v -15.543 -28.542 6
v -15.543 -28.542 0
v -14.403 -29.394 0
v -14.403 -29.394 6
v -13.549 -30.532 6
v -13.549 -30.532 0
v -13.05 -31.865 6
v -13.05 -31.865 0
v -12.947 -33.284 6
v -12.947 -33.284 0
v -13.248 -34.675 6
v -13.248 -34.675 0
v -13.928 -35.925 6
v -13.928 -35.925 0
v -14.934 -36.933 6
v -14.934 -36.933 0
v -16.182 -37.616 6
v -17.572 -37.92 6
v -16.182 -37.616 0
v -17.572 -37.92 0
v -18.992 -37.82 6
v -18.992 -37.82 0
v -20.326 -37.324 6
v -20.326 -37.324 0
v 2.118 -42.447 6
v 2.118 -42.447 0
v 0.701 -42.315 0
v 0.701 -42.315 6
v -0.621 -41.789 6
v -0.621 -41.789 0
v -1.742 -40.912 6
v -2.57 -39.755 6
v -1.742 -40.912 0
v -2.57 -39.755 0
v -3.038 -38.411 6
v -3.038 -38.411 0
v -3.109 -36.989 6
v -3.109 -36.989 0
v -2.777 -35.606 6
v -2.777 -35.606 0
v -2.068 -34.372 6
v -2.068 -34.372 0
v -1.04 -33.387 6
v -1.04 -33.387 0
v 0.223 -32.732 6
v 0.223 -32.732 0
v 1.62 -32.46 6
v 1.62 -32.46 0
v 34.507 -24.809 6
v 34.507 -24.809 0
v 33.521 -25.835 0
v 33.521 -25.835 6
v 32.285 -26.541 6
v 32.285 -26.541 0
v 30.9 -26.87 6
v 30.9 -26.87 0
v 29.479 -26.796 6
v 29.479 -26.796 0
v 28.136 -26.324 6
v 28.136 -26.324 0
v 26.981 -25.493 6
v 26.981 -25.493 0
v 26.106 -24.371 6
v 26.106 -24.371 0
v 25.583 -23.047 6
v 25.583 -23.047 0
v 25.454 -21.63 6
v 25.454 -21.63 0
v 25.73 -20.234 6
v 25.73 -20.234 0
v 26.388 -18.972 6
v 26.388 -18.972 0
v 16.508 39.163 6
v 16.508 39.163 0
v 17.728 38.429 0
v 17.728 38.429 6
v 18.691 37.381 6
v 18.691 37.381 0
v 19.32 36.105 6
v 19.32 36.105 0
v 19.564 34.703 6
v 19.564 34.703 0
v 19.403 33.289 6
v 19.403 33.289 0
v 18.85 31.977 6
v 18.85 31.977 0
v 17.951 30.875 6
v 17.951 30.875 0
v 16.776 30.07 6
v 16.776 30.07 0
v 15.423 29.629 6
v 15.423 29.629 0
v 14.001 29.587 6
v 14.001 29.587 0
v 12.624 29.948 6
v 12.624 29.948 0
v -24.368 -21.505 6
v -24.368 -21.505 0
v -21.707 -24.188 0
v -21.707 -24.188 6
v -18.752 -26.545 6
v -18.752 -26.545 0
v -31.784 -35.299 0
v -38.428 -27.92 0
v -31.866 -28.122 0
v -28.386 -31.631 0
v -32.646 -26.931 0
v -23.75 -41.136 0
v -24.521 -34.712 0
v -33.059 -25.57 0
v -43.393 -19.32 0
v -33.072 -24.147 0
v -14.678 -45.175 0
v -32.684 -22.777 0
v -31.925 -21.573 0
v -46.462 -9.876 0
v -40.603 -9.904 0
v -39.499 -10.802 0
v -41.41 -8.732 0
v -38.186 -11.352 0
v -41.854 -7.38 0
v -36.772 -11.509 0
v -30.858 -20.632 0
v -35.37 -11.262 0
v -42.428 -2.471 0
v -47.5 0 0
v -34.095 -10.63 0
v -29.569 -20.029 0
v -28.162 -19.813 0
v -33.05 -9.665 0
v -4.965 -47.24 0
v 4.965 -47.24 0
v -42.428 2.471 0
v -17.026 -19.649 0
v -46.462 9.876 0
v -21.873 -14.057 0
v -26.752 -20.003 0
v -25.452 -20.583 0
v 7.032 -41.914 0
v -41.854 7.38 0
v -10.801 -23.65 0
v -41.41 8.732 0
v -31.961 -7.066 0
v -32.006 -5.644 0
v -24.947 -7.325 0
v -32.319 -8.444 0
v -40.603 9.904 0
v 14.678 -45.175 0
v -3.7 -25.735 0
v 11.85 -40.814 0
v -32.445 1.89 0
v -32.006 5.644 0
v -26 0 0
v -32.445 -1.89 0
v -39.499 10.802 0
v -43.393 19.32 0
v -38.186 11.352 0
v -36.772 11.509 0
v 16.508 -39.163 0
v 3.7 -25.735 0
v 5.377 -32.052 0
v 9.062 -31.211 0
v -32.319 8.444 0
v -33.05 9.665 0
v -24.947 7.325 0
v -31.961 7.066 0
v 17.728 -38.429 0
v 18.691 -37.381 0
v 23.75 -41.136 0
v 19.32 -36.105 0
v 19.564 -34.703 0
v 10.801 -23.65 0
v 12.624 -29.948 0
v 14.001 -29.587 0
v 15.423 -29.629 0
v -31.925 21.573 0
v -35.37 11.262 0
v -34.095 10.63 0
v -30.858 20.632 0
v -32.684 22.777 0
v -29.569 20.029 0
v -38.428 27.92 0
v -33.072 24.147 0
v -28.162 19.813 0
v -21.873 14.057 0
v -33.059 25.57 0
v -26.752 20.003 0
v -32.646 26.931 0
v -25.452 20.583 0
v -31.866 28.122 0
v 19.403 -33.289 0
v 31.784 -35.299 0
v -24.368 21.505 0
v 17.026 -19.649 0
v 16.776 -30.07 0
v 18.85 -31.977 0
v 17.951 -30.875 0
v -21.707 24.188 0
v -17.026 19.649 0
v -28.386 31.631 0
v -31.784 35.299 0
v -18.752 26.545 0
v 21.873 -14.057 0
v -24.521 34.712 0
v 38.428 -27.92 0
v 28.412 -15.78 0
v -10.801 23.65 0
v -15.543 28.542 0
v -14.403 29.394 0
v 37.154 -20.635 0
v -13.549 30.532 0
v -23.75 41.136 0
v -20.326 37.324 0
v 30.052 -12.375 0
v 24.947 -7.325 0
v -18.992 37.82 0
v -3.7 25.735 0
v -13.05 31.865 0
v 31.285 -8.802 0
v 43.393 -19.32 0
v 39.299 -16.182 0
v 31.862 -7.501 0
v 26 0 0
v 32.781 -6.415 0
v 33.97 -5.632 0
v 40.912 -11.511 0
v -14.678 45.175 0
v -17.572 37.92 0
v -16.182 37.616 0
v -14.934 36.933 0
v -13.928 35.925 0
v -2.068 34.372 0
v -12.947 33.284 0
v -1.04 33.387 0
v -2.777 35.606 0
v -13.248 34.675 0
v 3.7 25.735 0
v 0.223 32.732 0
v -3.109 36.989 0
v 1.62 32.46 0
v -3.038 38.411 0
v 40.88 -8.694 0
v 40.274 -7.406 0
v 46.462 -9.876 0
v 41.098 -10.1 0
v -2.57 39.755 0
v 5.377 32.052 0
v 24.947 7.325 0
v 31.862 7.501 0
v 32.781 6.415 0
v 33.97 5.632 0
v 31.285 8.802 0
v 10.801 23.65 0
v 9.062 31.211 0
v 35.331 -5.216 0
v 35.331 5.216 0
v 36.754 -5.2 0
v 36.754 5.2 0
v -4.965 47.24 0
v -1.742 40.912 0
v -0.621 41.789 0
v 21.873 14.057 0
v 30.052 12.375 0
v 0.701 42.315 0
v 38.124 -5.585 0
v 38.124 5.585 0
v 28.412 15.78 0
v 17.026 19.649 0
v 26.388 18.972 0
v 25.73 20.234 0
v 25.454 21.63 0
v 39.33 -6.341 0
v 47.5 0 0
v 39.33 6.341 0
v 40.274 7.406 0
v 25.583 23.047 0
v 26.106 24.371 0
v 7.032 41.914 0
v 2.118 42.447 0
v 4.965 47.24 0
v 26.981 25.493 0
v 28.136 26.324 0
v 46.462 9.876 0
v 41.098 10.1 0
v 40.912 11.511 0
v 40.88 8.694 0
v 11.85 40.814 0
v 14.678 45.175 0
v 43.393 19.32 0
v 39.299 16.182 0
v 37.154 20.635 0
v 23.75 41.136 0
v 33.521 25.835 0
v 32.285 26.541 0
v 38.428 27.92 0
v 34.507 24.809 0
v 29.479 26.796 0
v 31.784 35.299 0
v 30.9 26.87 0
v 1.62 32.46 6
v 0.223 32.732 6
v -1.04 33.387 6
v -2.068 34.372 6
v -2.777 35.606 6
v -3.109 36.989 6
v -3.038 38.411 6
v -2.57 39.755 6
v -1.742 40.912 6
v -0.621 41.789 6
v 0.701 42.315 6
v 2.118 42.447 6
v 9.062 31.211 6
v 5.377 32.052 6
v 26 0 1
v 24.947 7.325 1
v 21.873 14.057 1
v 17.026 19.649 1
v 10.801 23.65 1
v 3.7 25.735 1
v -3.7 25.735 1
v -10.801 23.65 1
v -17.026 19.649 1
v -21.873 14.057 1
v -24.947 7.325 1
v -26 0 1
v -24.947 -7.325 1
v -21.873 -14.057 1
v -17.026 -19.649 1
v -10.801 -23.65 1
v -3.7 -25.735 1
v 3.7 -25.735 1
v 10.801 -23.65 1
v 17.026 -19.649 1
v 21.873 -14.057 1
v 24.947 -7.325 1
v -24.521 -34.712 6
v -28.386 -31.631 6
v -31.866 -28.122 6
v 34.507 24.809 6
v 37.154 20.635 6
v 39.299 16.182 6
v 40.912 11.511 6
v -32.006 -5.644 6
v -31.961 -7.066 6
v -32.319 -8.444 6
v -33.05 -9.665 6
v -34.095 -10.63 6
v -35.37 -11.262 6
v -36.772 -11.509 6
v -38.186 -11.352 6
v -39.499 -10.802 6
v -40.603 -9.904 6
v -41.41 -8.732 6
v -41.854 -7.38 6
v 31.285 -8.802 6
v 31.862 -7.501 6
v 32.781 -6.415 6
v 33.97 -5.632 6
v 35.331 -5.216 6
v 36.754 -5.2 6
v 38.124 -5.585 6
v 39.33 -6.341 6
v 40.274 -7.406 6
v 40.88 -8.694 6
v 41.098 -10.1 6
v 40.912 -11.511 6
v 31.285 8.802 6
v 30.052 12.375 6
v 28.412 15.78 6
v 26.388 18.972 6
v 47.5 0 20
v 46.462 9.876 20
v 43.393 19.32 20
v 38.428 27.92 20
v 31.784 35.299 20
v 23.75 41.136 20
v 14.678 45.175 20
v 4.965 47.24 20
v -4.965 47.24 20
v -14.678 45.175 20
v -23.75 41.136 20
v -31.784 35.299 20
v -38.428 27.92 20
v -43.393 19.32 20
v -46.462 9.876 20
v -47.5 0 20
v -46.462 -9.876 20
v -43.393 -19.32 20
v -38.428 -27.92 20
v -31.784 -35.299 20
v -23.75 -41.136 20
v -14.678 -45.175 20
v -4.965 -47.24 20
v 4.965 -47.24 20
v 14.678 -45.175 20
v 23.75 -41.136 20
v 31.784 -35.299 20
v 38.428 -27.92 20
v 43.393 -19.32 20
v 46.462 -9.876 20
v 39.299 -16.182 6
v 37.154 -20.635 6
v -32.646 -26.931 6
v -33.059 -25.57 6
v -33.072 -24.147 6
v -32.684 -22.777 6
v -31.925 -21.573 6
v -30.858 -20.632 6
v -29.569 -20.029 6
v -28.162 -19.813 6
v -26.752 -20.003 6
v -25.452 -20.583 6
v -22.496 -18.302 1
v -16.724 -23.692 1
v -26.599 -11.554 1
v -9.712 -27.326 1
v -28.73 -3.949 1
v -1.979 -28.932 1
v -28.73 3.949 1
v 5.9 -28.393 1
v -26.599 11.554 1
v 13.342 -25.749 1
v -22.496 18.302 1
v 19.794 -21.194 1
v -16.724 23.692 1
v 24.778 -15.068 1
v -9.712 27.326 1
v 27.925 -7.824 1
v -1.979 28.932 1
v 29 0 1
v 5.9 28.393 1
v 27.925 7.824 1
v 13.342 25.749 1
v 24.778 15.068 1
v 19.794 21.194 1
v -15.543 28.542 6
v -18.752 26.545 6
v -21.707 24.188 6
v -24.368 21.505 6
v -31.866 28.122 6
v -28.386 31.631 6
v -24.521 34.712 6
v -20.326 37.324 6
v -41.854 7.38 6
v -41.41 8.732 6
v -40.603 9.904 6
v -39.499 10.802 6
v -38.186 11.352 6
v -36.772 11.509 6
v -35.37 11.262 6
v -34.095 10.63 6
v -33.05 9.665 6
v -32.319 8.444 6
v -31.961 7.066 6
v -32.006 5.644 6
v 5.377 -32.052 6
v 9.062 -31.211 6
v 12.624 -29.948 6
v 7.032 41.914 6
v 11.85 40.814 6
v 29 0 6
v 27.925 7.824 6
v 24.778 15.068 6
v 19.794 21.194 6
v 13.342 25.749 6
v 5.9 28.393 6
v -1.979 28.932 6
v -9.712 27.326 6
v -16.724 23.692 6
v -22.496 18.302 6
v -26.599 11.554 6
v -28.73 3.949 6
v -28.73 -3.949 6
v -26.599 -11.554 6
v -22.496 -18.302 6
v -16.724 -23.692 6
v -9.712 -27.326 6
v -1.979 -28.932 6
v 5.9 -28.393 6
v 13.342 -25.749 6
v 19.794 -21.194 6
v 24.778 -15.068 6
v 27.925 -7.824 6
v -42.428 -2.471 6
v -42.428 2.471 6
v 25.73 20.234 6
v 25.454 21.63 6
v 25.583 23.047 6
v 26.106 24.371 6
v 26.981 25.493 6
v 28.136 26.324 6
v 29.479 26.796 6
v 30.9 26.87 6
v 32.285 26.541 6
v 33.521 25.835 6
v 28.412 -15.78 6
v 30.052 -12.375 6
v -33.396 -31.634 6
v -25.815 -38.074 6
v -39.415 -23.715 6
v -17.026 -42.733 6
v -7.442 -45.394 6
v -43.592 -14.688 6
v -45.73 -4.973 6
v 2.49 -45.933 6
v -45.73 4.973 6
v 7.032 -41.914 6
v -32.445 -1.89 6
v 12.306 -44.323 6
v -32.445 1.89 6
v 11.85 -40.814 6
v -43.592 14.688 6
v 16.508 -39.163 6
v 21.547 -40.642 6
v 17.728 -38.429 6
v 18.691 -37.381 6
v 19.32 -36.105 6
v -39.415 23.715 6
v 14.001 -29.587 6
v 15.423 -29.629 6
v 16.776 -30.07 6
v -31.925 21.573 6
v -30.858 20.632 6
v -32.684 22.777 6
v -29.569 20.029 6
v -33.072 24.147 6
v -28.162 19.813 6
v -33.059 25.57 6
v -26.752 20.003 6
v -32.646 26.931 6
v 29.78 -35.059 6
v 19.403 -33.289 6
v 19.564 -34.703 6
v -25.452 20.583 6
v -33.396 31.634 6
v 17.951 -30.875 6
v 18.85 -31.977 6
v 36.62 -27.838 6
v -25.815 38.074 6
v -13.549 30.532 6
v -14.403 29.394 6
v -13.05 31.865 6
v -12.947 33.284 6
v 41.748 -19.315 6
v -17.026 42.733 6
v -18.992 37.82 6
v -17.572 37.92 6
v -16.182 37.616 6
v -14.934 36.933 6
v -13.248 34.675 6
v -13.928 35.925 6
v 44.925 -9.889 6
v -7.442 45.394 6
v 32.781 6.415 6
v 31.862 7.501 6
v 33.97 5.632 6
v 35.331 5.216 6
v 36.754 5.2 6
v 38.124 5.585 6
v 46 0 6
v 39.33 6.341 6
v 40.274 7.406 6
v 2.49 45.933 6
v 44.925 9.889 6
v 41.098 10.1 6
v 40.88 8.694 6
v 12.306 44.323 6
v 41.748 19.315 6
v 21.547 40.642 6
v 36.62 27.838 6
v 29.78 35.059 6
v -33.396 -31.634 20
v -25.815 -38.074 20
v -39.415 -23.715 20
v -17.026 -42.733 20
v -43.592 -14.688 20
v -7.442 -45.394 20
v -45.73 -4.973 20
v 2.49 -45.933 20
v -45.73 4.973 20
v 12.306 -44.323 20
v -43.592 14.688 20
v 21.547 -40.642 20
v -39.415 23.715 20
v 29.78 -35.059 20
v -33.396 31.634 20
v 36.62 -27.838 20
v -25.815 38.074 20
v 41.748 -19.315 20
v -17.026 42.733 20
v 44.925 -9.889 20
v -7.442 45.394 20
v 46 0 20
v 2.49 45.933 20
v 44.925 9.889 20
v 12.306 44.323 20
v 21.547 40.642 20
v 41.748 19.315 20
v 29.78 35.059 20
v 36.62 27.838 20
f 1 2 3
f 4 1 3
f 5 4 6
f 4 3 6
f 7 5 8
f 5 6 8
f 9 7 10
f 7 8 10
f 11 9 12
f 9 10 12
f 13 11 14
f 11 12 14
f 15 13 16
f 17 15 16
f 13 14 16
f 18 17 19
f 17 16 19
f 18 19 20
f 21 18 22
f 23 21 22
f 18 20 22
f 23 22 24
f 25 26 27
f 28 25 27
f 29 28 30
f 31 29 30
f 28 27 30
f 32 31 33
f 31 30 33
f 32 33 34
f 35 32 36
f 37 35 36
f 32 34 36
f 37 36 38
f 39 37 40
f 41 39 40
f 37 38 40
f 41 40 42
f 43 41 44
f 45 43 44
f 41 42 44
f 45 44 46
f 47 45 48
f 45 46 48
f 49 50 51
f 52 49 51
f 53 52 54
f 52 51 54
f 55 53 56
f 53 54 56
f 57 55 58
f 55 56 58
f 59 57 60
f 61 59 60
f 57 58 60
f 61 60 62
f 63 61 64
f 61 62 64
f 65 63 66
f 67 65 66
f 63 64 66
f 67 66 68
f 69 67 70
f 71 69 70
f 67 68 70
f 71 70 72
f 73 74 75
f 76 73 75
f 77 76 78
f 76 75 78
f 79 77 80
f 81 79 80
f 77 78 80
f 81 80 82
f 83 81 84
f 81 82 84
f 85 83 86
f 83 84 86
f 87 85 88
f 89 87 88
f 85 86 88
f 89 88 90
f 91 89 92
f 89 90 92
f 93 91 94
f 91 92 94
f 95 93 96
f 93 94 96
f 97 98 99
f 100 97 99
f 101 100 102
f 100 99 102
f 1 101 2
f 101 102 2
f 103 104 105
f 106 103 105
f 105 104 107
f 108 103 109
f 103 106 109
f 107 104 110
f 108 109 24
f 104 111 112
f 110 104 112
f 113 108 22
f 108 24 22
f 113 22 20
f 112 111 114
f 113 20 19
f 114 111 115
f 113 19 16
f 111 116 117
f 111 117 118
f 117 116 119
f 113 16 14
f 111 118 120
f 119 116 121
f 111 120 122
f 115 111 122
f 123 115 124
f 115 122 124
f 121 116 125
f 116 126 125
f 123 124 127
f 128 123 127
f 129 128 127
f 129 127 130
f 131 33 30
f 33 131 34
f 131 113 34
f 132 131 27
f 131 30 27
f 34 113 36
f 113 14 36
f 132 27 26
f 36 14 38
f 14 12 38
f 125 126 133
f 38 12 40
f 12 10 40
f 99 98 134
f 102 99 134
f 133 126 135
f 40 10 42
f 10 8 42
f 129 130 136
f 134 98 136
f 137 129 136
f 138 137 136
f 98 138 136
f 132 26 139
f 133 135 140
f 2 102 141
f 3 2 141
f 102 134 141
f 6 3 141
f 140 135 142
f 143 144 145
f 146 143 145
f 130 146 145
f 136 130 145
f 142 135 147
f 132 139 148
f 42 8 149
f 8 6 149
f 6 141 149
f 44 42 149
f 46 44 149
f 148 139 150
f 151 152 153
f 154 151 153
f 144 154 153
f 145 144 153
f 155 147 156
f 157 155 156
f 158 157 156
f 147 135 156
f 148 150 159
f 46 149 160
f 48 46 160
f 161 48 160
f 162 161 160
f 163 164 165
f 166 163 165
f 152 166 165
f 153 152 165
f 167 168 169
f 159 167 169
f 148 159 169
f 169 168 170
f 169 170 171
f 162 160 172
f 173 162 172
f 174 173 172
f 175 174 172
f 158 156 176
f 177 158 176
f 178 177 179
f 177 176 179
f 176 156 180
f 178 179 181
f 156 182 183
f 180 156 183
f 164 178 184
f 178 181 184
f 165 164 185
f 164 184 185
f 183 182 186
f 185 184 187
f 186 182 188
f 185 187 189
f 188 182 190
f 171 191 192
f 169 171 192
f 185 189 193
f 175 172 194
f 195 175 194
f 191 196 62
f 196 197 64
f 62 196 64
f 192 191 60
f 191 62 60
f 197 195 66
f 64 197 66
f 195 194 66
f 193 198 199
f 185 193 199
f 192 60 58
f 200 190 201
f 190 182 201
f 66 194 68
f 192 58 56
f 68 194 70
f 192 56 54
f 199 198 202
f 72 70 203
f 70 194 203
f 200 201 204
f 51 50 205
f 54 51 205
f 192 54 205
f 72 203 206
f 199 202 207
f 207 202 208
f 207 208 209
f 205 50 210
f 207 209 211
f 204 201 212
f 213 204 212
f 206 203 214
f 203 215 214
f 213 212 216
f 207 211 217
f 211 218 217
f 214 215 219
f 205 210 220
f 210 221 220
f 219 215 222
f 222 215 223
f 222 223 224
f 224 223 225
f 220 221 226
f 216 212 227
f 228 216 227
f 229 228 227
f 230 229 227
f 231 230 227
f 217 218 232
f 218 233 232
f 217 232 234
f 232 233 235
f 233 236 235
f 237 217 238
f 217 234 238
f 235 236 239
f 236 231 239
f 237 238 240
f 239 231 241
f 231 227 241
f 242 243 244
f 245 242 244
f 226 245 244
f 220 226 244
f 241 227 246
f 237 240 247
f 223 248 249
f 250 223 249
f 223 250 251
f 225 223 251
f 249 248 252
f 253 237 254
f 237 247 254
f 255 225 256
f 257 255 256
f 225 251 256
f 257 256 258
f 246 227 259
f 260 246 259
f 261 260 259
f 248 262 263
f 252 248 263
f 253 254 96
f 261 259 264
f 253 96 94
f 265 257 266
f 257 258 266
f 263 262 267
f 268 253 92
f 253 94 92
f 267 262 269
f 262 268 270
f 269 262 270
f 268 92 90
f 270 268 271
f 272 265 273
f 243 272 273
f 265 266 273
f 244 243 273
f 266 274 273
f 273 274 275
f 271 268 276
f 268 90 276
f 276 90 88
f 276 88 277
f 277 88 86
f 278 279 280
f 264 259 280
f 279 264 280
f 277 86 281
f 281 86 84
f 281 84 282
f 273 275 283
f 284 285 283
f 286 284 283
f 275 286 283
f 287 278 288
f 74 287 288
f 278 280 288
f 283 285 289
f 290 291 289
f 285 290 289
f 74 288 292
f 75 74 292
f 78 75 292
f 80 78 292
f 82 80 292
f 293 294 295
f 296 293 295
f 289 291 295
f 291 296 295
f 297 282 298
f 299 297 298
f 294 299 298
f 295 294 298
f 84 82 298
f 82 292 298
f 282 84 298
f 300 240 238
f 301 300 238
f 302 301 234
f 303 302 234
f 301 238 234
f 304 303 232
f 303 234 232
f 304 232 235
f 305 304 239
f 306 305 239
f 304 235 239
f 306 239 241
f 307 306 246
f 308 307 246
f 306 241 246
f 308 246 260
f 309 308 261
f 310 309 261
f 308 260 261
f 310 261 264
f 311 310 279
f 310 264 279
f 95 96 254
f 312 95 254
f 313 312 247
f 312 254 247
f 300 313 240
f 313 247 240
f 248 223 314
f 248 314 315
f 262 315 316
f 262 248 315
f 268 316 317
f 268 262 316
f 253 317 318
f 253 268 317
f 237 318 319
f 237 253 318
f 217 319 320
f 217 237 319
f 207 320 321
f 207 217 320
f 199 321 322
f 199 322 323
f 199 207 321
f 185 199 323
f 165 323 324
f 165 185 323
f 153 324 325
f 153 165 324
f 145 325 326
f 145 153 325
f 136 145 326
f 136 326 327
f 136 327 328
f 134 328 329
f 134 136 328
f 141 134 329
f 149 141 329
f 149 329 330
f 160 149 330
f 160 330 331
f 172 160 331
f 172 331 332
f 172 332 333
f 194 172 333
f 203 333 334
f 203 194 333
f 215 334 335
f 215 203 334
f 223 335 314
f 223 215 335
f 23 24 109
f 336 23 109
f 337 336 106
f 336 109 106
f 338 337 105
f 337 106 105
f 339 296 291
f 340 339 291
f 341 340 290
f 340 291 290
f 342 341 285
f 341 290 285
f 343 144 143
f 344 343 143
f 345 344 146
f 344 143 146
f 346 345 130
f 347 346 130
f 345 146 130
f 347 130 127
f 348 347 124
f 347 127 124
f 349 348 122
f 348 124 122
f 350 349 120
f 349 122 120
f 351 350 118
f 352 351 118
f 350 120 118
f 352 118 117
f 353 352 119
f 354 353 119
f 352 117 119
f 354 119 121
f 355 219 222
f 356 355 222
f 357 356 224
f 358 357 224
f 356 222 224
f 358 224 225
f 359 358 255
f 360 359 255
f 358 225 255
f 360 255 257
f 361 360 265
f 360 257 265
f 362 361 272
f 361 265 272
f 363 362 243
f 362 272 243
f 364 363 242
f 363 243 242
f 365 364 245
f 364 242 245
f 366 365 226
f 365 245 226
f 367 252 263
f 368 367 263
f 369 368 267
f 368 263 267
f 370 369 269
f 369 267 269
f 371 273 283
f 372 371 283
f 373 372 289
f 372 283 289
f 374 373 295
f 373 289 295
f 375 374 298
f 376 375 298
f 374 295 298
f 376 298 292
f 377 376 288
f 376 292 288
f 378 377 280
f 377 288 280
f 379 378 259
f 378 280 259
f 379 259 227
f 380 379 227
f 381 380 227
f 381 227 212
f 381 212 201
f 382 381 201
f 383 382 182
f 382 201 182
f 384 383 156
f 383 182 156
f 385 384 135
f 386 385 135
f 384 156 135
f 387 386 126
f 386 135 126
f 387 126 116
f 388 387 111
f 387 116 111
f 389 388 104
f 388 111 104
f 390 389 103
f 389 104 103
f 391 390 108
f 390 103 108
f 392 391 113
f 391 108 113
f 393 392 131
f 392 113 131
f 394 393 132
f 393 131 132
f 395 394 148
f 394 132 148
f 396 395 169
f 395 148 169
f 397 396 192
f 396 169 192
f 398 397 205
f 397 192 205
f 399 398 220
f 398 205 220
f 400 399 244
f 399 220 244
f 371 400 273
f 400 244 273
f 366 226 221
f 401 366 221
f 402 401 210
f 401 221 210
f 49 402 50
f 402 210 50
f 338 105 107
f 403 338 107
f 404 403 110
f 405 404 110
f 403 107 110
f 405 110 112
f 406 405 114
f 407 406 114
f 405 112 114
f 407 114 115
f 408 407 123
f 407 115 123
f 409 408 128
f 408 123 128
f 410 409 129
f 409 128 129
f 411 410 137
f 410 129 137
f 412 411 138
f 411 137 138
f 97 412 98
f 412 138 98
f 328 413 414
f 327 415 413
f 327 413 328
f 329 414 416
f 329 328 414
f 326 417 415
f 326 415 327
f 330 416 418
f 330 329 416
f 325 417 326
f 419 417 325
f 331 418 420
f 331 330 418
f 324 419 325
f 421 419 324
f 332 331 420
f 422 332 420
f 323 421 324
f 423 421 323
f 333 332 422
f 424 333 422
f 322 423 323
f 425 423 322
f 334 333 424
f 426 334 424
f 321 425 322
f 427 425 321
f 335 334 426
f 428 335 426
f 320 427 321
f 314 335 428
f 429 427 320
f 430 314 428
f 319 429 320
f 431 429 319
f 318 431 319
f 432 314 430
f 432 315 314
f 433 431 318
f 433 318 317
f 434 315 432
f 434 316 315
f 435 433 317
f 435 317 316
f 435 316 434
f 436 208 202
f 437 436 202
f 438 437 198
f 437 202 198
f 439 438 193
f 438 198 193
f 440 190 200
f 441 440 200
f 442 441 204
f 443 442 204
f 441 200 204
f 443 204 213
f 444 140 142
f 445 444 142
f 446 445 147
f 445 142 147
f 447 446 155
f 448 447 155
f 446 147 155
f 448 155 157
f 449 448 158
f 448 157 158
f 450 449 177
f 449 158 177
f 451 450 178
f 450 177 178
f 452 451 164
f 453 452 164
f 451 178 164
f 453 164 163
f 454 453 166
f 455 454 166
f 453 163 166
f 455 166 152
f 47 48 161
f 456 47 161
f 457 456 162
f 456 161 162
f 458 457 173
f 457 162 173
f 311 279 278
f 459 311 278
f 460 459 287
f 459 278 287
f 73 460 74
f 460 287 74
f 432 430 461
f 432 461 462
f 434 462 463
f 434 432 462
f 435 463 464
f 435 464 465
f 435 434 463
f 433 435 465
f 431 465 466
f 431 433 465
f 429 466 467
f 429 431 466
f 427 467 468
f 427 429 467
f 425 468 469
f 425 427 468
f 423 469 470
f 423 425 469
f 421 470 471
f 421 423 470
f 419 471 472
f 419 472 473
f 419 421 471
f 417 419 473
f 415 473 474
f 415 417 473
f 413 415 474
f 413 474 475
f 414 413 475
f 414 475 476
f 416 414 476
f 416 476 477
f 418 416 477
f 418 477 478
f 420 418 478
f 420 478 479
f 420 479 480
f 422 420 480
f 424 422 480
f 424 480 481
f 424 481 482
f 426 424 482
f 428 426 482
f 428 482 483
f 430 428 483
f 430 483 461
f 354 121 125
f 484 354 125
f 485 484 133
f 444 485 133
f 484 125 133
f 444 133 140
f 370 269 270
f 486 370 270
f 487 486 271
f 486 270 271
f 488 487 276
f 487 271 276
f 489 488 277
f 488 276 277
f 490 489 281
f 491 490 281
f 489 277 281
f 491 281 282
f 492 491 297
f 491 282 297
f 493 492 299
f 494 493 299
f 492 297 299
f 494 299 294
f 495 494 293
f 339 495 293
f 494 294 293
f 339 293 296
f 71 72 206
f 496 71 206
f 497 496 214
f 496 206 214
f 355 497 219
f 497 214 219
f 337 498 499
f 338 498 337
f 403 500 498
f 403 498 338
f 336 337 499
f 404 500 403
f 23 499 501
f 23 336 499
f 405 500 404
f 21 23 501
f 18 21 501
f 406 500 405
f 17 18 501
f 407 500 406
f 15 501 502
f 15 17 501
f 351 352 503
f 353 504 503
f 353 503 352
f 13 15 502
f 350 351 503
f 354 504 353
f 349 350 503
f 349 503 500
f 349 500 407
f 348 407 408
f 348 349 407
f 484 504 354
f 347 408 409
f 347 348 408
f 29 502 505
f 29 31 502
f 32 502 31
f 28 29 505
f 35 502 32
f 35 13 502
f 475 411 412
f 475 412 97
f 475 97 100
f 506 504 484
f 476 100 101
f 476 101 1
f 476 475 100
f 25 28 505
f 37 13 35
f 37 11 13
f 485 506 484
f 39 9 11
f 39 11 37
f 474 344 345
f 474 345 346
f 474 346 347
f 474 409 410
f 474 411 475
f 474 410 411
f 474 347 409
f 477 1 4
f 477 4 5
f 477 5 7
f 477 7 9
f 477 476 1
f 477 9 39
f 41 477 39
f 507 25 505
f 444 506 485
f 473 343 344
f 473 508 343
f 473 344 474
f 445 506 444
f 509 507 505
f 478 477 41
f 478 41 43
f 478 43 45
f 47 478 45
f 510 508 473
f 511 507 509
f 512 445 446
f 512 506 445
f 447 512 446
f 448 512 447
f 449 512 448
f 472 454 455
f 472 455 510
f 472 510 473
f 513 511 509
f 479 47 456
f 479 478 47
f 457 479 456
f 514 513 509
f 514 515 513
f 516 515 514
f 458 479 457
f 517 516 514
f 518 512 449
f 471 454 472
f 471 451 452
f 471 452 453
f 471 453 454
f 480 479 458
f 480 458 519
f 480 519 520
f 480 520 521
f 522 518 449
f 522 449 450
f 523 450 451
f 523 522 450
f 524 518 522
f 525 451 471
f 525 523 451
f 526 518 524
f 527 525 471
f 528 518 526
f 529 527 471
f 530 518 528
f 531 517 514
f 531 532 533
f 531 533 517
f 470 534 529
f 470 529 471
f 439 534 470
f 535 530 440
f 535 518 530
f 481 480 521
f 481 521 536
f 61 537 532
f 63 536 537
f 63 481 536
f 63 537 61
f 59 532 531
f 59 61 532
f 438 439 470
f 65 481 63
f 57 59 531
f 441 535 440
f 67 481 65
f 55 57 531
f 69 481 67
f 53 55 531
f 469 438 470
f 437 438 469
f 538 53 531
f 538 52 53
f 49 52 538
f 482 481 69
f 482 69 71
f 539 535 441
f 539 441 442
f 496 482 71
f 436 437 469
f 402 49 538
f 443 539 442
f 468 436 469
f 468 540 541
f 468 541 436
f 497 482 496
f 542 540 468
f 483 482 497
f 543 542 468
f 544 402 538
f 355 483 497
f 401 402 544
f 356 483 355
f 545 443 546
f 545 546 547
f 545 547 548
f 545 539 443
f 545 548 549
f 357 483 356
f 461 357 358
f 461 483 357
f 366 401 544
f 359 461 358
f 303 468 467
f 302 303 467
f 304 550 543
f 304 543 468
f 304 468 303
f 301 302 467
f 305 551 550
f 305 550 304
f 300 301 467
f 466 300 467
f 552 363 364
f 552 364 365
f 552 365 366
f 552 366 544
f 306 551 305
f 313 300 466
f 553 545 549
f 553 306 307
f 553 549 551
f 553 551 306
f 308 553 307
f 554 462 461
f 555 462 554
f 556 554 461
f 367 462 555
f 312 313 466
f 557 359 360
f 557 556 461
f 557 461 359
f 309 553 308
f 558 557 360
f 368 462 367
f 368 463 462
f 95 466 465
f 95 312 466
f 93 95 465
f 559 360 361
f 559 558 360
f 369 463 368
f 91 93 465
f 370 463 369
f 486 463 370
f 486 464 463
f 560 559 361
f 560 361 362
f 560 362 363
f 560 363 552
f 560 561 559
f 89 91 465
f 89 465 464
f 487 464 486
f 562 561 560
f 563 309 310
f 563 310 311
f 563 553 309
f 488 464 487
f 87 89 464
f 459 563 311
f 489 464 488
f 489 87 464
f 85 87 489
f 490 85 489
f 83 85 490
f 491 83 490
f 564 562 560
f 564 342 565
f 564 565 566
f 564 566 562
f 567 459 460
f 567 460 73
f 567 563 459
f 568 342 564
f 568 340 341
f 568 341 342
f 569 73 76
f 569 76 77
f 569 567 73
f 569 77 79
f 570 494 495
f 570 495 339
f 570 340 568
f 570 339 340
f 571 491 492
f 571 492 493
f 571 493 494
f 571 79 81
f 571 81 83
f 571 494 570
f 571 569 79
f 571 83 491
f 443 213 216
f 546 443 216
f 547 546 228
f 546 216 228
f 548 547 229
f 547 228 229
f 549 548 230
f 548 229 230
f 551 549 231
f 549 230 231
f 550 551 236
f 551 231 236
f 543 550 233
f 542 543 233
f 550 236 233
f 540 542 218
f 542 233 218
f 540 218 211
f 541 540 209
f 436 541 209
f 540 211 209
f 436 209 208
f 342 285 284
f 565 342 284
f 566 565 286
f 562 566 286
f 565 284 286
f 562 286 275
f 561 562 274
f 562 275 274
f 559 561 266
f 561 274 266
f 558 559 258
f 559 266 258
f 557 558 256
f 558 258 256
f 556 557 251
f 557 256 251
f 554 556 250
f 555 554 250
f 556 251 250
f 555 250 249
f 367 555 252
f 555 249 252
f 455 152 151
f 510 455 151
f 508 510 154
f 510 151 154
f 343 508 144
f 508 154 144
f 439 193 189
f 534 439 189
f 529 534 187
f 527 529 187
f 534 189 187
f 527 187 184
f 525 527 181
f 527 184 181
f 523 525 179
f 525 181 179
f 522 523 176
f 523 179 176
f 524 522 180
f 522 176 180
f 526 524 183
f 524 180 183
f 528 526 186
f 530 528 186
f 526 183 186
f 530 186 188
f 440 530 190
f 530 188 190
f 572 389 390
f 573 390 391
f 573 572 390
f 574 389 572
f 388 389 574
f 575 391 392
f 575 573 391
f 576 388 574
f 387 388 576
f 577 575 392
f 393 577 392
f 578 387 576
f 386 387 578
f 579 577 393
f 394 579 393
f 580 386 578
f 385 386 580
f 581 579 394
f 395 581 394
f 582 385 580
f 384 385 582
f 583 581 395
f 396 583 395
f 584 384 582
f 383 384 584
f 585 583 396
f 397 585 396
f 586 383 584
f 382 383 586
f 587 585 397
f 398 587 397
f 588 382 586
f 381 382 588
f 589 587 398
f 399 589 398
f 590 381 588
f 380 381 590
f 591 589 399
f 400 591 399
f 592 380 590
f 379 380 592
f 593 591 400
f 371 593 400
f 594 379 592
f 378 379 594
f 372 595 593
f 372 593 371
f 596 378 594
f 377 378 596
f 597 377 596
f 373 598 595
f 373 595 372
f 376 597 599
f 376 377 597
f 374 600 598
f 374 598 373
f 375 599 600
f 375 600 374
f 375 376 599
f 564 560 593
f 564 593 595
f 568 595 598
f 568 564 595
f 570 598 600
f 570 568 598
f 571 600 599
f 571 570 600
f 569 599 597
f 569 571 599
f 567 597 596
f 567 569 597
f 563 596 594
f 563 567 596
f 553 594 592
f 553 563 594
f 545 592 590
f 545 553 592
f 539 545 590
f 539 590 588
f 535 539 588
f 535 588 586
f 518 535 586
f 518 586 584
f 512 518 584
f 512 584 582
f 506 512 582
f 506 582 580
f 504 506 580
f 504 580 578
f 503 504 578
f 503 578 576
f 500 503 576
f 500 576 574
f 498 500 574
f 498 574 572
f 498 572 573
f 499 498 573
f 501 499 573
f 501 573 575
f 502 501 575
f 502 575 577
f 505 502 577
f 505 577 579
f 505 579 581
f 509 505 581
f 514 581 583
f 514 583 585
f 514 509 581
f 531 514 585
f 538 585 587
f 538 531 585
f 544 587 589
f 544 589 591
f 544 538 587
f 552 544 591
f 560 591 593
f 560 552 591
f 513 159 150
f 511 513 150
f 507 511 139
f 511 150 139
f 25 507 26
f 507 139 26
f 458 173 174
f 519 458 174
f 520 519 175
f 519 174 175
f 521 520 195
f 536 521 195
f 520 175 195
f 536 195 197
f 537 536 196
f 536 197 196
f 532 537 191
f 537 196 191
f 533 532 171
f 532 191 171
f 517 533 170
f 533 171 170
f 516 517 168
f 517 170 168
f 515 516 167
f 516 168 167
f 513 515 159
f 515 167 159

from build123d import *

# Parameters (mm, degrees)
SKETCH1_R           = 47.5
SKETCH1_R_2         = 46
BOSS_EXTRUDE1_DEPTH = 20
SKETCH1_5_R         = 46
SKETCH1_5_R_2       = 29
BOSS_EXTRUDE2_DEPTH = 6
SKETCH1_7_R         = 29
SKETCH1_7_R_2       = 26
BOSS_EXTRUDE4_DEPTH = 1


with BuildPart() as part:
    # Sketch1 → Boss-Extrude1 (new body)
    with BuildSketch(Plane.XY):
        Circle(SKETCH1_R)
        Circle(SKETCH1_R_2, mode=Mode.SUBTRACT)
    extrude(amount=BOSS_EXTRUDE1_DEPTH)

    # Sketch1<5> → Boss-Extrude2 (add)
    with BuildSketch(Plane.XY):
        Circle(SKETCH1_5_R)
        with BuildLine():
            ThreePointArc((-31.865701126, -28.121648098), (-31.425224299, -21.064312895), (-24.367889096, -21.504789722))
            ThreePointArc((-24.367889096, -21.504789722), (-20.26341856, -25.40952318), (-15.543254305, -28.542201135))
            ThreePointArc((-15.543254305, -28.542201135), (-13.543416331, -35.324578894), (-20.325794091, -37.324416868))
            ThreePointArc((-20.325794091, -37.324416868), (-26.498316579, -33.227838005), (-31.865701126, -28.121648098))
        make_face(mode=Mode.SUBTRACT)
        with BuildLine():
            ThreePointArc((2.118450141, -42.447169152), (-3.124563894, -37.702613974), (1.619991284, -32.45959994))
            ThreePointArc((1.619991284, -32.45959994), (7.231930354, -31.685157146), (12.624130879, -29.947976886))
            ThreePointArc((12.624130879, -29.947976886), (19.17368592, -32.613183964), (16.508478842, -39.162739004))
            ThreePointArc((16.508478842, -39.162739004), (9.457139693, -41.434436268), (2.118450141, -42.447169152))
        make_face(mode=Mode.SUBTRACT)
        with BuildLine():
            ThreePointArc((34.507365243, -24.80910607), (27.528956853, -25.950077737), (26.387985186, -18.971669348))
            ThreePointArc((26.387985186, -18.971669348), (29.281488207, -14.101221521), (31.285288026, -8.802315215))
            ThreePointArc((31.285288026, -8.802315215), (37.452611601, -5.343396321), (40.911530495, -11.510719896))
            ThreePointArc((40.911530495, -11.510719896), (38.291176886, -18.440058912), (34.507365243, -24.80910607))
        make_face(mode=Mode.SUBTRACT)
        with BuildLine():
            ThreePointArc((-41.854329503, -7.380047551), (-42.5, 0), (-41.854329503, 7.380047551))
            ThreePointArc((-41.854329503, 7.380047551), (-36.06204985, 11.435845428), (-32.006251973, 5.643565774))
            ThreePointArc((-32.006251973, 5.643565774), (-32.5, 0), (-32.006251973, -5.643565774))
            ThreePointArc((-32.006251973, -5.643565774), (-36.06204985, -11.435845428), (-41.854329503, -7.380047551))
        make_face(mode=Mode.SUBTRACT)
        with BuildLine():
            ThreePointArc((-20.325794091, 37.324416868), (-13.543416331, 35.324578894), (-15.543254305, 28.542201135))
            ThreePointArc((-15.543254305, 28.542201135), (-20.26341856, 25.40952318), (-24.367889096, 21.504789722))
            ThreePointArc((-24.367889096, 21.504789722), (-31.425224299, 21.064312895), (-31.865701126, 28.121648098))
            ThreePointArc((-31.865701126, 28.121648098), (-26.498316579, 33.227838005), (-20.325794091, 37.324416868))
        make_face(mode=Mode.SUBTRACT)
        Circle(SKETCH1_5_R_2, mode=Mode.SUBTRACT)
        with BuildLine():
            ThreePointArc((40.911530495, 11.510719896), (37.452611601, 5.343396321), (31.285288026, 8.802315215))
            ThreePointArc((31.285288026, 8.802315215), (29.281488207, 14.101221521), (26.387985186, 18.971669348))
            ThreePointArc((26.387985186, 18.971669348), (27.528956853, 25.950077737), (34.507365243, 24.80910607))
            ThreePointArc((34.507365243, 24.80910607), (38.291176886, 18.440058912), (40.911530495, 11.510719896))
        make_face(mode=Mode.SUBTRACT)
        with BuildLine():
            ThreePointArc((16.508478842, 39.162739004), (19.17368592, 32.613183964), (12.624130879, 29.947976886))
            ThreePointArc((12.624130879, 29.947976886), (7.231930354, 31.685157146), (1.619991284, 32.45959994))
            ThreePointArc((1.619991284, 32.45959994), (-3.124563894, 37.702613974), (2.118450141, 42.447169152))
            ThreePointArc((2.118450141, 42.447169152), (9.457139693, 41.434436268), (16.508478842, 39.162739004))
        make_face(mode=Mode.SUBTRACT)
    extrude(amount=BOSS_EXTRUDE2_DEPTH)

    # Sketch1<7> → Boss-Extrude4 (add)
    with BuildSketch(Plane.XY):
        Circle(SKETCH1_7_R)
        Circle(SKETCH1_7_R_2, mode=Mode.SUBTRACT)
    extrude(amount=BOSS_EXTRUDE4_DEPTH)


solid = part.part
